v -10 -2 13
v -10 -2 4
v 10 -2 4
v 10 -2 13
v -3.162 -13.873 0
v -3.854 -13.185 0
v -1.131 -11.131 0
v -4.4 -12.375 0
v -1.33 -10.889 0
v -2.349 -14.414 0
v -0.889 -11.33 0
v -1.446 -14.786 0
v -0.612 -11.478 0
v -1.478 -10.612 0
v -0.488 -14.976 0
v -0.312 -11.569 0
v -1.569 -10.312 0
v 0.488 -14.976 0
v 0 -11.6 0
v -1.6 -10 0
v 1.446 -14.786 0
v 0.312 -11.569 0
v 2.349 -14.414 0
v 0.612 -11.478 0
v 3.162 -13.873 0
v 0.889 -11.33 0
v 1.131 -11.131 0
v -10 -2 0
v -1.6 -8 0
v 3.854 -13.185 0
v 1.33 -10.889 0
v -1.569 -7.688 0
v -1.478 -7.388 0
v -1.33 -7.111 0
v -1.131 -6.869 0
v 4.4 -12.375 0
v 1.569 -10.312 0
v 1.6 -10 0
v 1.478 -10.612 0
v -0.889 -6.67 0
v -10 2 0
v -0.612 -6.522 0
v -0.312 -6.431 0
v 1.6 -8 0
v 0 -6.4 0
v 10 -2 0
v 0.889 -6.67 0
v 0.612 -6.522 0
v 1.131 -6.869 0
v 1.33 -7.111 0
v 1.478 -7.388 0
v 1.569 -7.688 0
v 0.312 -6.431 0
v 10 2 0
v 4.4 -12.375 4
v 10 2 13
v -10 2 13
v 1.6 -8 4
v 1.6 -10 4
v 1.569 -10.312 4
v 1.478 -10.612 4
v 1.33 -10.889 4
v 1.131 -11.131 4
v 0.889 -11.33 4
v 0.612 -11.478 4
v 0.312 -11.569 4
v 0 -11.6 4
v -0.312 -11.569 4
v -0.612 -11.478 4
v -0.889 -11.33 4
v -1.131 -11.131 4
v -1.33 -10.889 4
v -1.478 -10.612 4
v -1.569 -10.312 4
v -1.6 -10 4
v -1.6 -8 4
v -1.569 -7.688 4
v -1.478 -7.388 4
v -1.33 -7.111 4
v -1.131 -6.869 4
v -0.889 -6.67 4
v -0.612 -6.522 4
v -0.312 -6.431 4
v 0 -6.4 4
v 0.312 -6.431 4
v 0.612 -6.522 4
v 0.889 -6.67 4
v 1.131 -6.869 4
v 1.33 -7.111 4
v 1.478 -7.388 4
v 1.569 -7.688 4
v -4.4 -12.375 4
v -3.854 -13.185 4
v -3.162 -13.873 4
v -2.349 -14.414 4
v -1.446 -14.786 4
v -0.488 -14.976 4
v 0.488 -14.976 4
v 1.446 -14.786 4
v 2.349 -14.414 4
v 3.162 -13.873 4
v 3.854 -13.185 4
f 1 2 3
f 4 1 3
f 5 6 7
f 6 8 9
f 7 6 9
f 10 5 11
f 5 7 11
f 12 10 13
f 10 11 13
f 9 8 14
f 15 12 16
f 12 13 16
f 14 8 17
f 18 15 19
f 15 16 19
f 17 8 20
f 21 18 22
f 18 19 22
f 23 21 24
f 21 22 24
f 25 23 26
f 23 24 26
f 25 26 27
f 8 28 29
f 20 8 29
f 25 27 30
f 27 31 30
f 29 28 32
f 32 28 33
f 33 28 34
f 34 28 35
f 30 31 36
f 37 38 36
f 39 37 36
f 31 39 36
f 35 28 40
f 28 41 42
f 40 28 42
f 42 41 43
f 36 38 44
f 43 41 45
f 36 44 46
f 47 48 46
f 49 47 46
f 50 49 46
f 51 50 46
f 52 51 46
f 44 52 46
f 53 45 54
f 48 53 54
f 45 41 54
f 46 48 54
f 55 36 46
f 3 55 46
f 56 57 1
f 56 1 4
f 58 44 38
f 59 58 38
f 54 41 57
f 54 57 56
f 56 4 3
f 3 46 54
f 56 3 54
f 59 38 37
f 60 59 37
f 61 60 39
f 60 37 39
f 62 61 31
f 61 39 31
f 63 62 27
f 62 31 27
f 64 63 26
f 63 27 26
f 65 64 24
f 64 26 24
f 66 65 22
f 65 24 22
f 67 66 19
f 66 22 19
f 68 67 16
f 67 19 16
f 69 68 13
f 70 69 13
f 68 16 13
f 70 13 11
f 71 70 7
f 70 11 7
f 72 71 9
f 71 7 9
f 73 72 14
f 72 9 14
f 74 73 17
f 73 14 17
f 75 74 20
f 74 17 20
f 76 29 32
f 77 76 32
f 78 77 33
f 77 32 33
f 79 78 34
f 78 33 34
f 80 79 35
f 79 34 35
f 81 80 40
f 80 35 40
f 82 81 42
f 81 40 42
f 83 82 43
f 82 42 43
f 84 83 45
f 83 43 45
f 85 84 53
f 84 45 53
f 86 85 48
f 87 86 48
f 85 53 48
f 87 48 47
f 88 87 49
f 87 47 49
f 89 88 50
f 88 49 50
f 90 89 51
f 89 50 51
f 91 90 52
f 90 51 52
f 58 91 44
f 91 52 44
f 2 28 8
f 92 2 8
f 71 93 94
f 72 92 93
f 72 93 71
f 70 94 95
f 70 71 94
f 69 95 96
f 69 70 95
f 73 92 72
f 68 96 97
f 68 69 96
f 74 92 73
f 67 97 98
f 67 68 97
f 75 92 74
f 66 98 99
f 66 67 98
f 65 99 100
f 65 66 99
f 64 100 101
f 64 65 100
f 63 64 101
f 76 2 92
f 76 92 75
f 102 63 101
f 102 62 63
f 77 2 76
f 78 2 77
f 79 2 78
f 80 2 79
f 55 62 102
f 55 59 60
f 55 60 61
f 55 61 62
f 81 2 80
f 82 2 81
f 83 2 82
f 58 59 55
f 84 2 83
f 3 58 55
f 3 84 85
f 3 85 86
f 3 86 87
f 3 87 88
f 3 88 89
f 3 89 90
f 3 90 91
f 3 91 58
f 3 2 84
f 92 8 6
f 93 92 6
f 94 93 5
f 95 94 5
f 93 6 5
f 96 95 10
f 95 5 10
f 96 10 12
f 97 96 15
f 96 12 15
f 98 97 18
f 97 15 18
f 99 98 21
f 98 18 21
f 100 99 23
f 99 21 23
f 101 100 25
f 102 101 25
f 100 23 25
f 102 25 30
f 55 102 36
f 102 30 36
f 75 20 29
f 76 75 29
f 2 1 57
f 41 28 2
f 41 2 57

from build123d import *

# Parameters (mm, degrees)
F1_DEPTH = 4
F0_W     = 20
F0_H     = 4
F2_DEPTH = 13


with BuildPart() as f1:
    # F0 (on Top) → F1 (new body)
    with BuildSketch(Plane.XY):
        with BuildLine():
            Line((4.399958, -12.374947), (10, -2))
            Line((10, -2), (-10, -2))
            Line((-10, -2), (-4.399958, -12.374947))
            ThreePointArc((-4.399958, -12.374947), (0, -15), (4.399958, -12.374947))
        make_face()
        with BuildLine():
            Line((-1.6, -10), (-1.6, -8))
            ThreePointArc((-1.6, -8), (0, -6.4), (1.6, -8))
            Line((1.6, -8), (1.6, -10))
            ThreePointArc((1.6, -10), (0, -11.6), (-1.6, -10))
        make_face(mode=Mode.SUBTRACT)
    extrude(amount=F1_DEPTH)

    # F0 (on Top) → F2 (join)
    with BuildSketch(Plane.XY):
        Rectangle(F0_W, F0_H)
    extrude(amount=F2_DEPTH)


solid = f1.part
